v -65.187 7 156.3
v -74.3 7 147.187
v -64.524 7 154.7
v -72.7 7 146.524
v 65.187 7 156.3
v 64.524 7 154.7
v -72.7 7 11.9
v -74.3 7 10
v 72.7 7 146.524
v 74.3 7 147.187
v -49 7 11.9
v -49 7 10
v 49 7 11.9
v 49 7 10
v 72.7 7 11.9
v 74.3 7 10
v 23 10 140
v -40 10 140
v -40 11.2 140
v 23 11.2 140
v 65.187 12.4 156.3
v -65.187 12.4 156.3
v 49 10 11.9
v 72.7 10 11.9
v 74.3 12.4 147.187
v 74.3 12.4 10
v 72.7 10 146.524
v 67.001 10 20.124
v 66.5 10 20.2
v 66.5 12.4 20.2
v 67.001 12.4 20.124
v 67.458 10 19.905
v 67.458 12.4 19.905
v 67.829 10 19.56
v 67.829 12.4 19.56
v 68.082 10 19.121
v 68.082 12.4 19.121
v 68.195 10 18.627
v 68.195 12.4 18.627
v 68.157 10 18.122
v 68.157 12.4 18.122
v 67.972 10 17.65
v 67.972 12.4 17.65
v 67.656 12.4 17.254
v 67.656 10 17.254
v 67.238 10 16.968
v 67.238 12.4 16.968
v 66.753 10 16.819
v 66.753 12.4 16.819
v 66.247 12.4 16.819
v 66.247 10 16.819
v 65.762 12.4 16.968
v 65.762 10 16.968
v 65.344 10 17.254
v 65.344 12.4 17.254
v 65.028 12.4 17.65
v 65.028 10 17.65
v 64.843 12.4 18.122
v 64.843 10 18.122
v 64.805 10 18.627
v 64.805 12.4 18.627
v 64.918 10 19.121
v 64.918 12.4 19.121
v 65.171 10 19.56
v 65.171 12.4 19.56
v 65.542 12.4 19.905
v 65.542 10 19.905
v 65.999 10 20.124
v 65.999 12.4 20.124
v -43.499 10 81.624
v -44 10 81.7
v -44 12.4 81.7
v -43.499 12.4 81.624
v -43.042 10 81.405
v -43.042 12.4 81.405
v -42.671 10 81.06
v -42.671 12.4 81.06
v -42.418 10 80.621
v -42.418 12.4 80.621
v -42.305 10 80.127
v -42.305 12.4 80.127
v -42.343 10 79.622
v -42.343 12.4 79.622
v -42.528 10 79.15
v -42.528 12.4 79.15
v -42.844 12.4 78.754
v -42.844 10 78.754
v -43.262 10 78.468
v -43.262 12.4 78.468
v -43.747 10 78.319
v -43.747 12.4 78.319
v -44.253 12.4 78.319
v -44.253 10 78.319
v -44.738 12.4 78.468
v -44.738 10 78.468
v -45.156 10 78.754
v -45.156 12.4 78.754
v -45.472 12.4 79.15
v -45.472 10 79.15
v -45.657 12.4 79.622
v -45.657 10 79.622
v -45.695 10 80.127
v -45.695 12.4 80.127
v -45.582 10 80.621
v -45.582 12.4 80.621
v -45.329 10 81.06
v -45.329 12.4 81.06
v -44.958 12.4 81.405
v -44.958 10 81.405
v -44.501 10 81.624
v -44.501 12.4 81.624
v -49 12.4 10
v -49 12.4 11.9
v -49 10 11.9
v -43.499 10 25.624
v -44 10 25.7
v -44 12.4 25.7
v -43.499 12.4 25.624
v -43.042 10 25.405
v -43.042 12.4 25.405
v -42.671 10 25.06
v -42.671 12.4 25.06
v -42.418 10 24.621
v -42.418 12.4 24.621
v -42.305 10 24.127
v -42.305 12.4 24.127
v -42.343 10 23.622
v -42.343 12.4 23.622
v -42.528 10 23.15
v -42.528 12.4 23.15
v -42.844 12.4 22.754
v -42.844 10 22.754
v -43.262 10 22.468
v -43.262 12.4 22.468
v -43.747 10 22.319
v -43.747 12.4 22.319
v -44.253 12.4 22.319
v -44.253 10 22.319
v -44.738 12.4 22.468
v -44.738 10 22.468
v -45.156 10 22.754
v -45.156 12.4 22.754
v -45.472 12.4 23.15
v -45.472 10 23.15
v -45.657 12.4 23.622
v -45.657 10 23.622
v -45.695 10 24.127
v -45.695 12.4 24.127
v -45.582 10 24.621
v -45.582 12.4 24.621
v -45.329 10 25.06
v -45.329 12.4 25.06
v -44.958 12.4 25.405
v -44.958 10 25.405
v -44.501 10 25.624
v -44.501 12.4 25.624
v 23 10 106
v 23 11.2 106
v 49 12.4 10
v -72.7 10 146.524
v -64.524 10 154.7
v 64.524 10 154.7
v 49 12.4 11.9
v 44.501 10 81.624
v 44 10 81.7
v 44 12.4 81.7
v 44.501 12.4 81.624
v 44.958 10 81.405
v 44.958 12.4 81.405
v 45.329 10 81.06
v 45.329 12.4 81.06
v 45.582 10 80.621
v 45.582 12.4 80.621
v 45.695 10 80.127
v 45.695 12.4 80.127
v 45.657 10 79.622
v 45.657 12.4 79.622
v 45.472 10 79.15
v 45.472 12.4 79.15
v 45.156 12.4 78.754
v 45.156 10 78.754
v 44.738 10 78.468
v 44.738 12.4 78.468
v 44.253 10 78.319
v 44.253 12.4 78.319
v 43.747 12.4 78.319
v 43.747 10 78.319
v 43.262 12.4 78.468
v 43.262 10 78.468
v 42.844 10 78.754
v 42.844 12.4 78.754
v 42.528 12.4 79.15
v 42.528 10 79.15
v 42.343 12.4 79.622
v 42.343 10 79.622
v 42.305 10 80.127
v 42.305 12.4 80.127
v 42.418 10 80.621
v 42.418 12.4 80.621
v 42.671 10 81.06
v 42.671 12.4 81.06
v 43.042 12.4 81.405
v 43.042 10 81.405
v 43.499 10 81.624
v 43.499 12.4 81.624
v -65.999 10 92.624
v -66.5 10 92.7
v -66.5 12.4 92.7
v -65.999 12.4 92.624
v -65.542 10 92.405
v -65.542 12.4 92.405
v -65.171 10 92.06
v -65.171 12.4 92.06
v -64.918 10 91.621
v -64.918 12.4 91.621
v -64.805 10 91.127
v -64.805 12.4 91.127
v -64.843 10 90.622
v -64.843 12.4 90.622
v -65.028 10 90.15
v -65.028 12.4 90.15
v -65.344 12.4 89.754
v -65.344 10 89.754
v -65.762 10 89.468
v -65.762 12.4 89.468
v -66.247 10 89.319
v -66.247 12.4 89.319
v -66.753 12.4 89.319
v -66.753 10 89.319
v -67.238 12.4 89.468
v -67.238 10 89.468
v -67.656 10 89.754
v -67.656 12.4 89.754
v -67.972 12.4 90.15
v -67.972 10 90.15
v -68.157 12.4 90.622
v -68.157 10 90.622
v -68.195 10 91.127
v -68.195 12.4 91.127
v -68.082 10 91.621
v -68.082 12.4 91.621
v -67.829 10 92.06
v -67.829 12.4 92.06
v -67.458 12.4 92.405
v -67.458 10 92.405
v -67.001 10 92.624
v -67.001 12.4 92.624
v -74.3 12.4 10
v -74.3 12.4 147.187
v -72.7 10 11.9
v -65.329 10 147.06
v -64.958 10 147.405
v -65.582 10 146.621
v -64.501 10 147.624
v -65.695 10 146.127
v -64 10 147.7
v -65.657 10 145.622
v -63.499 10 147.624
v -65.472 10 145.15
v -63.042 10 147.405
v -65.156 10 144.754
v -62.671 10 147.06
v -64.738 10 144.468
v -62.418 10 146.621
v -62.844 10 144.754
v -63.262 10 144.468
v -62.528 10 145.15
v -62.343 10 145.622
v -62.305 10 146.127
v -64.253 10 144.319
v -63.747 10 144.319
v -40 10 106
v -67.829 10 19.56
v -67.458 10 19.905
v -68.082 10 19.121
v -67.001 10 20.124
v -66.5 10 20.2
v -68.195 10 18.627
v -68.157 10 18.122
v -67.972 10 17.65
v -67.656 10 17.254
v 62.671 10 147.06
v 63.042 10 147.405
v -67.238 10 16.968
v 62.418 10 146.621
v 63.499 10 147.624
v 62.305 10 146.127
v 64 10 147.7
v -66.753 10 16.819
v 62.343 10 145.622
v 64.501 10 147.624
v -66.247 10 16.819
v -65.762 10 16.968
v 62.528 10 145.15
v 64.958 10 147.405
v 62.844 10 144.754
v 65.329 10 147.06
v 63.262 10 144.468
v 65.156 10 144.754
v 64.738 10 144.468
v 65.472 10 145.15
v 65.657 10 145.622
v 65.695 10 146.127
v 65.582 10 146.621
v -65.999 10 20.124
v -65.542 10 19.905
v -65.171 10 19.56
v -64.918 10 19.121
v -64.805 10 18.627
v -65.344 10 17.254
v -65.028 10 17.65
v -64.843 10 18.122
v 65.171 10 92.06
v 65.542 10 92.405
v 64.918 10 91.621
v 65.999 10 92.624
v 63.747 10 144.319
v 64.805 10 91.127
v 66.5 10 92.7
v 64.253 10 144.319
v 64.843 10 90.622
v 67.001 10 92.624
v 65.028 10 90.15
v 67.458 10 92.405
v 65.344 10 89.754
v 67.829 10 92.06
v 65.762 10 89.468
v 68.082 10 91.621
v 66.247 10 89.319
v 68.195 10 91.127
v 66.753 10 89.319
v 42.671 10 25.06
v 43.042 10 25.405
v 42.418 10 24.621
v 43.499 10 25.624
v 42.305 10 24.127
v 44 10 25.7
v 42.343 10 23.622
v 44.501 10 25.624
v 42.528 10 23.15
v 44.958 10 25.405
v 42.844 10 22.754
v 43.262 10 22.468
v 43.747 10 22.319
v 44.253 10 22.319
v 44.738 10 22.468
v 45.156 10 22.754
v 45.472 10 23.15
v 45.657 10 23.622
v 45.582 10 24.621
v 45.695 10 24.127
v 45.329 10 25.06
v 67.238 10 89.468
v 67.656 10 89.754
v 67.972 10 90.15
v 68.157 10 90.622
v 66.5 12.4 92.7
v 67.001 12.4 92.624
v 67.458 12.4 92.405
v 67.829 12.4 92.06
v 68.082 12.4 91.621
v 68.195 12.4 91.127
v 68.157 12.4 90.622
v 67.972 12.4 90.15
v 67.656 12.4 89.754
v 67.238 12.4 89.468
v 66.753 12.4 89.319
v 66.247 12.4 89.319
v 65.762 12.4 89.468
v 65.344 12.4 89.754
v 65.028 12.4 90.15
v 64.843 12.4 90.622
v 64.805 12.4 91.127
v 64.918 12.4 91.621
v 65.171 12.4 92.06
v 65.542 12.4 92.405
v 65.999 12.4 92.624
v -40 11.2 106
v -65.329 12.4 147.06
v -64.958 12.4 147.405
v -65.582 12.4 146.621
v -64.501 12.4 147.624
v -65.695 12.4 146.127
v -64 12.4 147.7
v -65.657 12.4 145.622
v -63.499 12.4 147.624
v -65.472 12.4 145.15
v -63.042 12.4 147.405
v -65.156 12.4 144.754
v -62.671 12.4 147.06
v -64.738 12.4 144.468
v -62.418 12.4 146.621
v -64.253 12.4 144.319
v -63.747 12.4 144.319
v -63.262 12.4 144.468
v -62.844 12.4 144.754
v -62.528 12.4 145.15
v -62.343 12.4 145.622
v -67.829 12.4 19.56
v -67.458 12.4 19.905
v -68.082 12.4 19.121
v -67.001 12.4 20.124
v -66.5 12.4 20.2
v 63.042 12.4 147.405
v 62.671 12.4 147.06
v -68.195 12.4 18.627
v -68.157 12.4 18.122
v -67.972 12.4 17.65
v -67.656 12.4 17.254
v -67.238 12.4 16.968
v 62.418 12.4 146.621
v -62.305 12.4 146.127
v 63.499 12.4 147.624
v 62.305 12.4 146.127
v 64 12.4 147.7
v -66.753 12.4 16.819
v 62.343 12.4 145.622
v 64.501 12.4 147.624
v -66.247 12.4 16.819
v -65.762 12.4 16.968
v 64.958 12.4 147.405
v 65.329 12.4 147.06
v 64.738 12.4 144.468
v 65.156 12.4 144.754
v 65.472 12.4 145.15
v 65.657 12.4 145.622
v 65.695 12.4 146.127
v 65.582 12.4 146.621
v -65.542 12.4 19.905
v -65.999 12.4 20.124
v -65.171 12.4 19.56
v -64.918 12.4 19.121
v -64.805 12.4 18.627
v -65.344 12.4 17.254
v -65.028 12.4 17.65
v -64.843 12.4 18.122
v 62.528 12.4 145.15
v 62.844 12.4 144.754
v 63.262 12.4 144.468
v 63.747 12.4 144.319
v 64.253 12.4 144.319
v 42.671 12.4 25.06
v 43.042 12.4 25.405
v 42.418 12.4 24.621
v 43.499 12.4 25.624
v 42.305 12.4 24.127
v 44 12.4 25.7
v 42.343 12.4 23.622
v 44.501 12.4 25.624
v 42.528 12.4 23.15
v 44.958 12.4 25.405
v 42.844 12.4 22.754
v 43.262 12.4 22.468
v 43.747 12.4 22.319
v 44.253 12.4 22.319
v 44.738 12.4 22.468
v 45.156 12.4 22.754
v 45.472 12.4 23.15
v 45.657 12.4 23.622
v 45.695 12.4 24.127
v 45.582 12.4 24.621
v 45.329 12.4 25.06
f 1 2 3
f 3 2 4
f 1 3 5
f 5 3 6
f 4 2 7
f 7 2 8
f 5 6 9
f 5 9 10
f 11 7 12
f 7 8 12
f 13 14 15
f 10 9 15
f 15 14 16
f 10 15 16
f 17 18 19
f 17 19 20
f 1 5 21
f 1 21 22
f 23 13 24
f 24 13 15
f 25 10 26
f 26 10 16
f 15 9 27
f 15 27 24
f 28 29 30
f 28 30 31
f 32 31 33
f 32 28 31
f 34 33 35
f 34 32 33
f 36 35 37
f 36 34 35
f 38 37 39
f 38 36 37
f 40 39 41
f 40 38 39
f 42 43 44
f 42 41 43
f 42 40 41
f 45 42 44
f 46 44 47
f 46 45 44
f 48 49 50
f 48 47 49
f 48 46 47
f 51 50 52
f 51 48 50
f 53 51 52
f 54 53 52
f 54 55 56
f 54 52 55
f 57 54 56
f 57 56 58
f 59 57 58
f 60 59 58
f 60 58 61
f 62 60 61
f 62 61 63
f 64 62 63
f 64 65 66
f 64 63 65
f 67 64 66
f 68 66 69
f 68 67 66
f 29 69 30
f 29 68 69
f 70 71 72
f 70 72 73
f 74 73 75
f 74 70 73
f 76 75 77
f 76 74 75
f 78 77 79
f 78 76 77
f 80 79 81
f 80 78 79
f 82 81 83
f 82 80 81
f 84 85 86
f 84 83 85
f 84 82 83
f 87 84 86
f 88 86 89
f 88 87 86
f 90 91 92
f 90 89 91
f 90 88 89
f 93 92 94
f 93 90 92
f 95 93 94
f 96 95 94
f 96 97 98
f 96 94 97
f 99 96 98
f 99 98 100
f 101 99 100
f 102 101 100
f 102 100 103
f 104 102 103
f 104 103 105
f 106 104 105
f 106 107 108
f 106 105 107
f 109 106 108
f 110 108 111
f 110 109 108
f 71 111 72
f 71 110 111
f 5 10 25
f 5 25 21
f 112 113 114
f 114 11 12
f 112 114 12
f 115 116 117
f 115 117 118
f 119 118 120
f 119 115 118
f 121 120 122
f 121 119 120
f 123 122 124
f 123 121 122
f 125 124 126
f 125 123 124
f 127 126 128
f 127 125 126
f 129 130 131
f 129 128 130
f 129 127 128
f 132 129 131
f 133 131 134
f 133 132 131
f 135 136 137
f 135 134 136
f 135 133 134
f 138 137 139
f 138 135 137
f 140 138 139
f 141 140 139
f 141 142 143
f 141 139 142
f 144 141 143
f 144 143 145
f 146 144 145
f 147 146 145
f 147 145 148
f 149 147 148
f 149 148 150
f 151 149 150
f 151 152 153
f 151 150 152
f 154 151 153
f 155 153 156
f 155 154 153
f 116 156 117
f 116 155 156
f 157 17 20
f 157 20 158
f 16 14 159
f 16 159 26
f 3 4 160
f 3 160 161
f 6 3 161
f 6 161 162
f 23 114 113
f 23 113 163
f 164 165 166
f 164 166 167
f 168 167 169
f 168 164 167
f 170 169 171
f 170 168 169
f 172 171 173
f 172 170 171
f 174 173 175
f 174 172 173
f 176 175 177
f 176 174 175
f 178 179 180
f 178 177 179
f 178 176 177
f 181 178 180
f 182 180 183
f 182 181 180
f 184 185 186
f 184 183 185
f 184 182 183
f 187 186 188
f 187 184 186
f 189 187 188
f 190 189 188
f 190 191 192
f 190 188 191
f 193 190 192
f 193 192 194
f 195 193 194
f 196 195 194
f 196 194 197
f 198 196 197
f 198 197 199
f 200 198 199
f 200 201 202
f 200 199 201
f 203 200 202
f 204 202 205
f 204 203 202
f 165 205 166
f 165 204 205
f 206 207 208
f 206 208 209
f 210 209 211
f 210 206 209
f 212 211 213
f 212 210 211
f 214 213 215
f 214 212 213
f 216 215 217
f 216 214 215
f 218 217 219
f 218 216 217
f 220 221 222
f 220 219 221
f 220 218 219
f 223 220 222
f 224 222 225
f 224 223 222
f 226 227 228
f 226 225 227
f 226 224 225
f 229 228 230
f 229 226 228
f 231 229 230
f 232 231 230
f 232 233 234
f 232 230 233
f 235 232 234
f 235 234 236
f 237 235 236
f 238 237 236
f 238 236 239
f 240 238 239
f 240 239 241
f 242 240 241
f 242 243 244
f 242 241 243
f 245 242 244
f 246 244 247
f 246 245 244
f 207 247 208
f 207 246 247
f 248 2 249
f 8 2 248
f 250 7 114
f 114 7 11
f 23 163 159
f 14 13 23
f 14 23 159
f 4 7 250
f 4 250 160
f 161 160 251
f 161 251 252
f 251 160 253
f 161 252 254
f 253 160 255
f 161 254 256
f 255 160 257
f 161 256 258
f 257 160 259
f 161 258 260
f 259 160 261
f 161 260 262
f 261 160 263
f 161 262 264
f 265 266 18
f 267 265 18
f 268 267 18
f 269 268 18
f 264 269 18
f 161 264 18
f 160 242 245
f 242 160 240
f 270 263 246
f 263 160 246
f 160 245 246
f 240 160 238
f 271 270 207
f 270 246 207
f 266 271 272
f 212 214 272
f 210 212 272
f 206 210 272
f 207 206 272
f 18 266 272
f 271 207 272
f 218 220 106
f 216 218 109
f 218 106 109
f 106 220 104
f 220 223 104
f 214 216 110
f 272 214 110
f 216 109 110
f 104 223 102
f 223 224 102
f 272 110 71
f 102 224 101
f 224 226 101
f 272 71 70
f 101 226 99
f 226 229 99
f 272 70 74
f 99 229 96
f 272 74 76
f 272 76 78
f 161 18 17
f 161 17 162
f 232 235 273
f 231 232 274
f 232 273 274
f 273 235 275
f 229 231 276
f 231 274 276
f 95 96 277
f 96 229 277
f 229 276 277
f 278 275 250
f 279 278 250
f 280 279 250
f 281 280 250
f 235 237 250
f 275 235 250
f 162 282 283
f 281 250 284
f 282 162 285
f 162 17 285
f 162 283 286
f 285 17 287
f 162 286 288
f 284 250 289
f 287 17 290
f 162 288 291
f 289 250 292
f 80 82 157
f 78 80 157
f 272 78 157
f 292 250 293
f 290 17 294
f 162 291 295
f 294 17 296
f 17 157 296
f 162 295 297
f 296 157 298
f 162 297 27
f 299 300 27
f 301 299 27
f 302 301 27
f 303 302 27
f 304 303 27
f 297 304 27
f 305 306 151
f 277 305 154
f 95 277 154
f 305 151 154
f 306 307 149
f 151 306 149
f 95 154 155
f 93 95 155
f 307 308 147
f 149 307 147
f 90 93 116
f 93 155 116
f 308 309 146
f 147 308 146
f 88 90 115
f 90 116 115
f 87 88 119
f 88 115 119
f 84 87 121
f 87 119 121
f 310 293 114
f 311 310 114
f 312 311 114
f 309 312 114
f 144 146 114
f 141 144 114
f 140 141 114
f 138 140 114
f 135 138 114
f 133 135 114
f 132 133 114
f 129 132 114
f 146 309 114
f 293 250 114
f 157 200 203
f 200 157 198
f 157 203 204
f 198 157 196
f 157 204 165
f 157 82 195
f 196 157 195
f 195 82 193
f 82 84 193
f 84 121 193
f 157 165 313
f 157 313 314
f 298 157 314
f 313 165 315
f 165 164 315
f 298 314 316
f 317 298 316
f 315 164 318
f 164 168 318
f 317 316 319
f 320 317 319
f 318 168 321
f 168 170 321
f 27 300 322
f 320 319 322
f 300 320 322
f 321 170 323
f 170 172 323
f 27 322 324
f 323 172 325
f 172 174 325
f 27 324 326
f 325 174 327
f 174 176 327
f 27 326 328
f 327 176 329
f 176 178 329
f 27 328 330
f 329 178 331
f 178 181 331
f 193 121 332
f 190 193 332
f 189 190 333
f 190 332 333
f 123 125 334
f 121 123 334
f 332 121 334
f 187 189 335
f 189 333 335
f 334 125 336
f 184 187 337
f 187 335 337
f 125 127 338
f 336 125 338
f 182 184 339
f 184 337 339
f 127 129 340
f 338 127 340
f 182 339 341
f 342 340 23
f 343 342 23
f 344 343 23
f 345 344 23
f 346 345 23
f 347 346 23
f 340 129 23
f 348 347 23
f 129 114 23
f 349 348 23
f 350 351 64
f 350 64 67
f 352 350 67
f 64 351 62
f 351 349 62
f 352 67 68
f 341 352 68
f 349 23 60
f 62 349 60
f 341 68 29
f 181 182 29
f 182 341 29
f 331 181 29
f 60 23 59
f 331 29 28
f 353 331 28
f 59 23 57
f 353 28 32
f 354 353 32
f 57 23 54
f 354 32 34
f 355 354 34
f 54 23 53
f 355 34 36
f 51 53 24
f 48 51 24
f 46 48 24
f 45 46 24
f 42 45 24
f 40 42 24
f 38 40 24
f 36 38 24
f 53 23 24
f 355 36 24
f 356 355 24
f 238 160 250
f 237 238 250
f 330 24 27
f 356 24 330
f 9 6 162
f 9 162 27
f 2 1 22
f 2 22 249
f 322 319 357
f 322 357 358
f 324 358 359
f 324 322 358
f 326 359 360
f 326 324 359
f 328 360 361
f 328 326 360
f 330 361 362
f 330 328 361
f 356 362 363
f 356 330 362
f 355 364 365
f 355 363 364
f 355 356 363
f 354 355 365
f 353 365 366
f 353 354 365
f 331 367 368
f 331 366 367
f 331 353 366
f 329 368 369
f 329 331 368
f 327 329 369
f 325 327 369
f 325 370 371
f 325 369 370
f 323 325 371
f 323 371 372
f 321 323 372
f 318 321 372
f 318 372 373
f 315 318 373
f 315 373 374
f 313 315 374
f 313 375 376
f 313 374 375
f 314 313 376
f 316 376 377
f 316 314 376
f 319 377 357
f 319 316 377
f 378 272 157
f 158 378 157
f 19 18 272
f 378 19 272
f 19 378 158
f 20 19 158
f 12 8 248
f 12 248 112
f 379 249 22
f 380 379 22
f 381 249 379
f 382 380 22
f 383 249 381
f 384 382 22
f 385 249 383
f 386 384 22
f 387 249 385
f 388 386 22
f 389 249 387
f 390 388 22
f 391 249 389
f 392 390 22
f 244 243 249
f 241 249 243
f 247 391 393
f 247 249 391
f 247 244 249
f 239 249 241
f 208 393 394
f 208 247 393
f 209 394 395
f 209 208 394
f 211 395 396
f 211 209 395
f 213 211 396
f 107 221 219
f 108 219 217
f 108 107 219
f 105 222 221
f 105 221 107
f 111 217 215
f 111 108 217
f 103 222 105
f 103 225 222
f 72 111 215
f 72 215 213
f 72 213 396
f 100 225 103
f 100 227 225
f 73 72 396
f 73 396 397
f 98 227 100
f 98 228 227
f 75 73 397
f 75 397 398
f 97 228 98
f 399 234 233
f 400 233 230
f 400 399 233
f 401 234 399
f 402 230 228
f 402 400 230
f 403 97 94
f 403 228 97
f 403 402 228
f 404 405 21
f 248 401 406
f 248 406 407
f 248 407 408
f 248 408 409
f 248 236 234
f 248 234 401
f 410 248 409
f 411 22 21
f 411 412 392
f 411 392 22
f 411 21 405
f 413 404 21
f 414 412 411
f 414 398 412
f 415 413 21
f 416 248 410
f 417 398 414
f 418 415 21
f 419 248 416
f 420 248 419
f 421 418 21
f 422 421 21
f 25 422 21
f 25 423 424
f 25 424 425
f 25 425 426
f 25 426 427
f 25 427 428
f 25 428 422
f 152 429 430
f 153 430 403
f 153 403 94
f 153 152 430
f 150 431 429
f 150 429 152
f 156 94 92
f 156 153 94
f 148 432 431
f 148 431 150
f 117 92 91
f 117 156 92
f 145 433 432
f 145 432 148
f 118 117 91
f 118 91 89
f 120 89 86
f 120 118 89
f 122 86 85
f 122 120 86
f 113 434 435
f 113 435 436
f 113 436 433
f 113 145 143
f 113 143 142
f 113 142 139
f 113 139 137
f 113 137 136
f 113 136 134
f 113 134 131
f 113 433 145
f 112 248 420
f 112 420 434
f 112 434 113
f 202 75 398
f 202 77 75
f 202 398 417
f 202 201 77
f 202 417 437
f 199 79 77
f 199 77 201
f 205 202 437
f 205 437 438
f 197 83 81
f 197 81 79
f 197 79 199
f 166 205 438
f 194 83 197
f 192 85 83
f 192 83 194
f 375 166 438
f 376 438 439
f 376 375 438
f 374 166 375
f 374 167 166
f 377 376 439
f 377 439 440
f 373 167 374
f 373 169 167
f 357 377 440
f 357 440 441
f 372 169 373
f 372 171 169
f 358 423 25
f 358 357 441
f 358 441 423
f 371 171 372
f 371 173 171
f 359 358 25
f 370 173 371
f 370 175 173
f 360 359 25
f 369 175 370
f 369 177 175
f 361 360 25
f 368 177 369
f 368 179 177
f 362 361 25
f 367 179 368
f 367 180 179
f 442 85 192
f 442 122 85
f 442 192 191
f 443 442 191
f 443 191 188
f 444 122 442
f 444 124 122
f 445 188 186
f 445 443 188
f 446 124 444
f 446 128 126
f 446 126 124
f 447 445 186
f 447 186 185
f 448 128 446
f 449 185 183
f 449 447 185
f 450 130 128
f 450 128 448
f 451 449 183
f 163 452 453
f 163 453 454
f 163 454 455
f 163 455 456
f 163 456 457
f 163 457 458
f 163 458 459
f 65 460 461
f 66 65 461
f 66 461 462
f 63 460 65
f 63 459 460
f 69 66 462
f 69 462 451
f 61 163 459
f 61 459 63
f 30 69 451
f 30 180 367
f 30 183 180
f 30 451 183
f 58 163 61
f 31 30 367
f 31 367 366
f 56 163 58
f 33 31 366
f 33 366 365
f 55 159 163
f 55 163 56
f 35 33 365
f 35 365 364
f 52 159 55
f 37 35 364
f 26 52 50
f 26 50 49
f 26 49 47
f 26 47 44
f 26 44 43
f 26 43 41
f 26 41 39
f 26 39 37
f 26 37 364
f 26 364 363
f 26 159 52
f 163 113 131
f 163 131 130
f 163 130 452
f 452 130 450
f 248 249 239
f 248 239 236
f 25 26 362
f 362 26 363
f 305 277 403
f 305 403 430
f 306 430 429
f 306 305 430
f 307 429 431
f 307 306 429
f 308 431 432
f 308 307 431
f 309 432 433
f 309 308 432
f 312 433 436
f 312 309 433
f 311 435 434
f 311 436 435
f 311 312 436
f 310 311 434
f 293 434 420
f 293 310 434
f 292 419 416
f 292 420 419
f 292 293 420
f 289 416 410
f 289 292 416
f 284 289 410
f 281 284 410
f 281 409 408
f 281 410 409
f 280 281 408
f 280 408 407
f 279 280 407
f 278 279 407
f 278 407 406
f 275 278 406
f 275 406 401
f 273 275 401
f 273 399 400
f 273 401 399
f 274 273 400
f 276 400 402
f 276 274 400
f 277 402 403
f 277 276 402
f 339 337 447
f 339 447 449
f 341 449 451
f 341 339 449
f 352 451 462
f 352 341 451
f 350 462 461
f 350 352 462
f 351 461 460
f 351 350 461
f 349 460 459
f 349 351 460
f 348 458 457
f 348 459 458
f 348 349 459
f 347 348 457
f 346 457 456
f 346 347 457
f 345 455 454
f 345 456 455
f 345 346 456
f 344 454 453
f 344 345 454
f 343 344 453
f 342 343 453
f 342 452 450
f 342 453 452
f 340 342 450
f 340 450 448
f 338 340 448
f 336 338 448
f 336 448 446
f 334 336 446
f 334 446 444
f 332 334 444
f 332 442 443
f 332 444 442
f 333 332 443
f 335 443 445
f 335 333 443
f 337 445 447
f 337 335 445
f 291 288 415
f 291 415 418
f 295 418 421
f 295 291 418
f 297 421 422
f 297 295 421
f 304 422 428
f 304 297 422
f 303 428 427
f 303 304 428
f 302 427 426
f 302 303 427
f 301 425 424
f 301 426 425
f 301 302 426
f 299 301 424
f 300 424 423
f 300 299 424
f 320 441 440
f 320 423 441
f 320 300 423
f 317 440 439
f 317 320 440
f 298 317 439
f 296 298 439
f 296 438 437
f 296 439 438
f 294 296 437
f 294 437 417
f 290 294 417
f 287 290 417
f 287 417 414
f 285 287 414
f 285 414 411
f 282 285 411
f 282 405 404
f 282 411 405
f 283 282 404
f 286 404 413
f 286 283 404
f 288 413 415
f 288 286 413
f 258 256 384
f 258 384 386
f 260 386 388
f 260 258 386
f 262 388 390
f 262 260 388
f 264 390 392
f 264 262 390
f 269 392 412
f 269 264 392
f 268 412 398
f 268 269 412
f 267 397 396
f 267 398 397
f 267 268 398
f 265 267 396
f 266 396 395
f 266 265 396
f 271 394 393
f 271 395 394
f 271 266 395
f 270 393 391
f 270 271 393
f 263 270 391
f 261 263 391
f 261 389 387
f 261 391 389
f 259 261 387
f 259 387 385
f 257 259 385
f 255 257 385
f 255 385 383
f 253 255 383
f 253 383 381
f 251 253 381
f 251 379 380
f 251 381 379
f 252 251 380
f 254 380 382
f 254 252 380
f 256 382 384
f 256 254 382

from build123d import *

# Parameters (mm, degrees)
LID_PLATE_DEPTH        = 2.4
DRIP_SKIRT_DEPTH       = 3.01
SKETCH3_W              = 25.3
SKETCH3_H              = 1.9
FRONT_SKIRT_L_DEPTH    = 5.4
SKETCH4_W              = 25.3
SKETCH4_H              = 1.9
FRONT_SKIRT_R_DEPTH    = 5.4
SKETCH5_W              = 63
SKETCH5_H              = 34
GNSS_THIN_WINDOW_DEPTH = 1.7
SKETCH6_R              = 1.7
SCREW_HOLES_DEPTH      = 4.4


with BuildPart() as part:
    # Sketch1 → Lid Plate (new body)
    with BuildSketch(Plane(origin=(0, 10, 0), x_dir=(1, 0, 0), z_dir=(0, 1, 0))):
        Polygon((-65.187005769, -156.3), (65.187005769, -156.3), (74.3, -147.187005769), (74.3, -11.9), (-74.3, -11.9), (-74.3, -147.187005769), align=None)
    extrude(amount=LID_PLATE_DEPTH)

    # Sketch2 → Drip Skirt (add)
    with BuildSketch(Plane(origin=(0, 7, 0), x_dir=(1, 0, 0), z_dir=(0, 1, 0))):
        Polygon((74.3, -11.9), (74.3, -147.187005769), (65.187005769, -156.3), (-65.187005769, -156.3), (-74.3, -147.187005769), (-74.3, -11.9), (-72.7, -11.9), (-72.7, -146.524264069), (-64.524264069, -154.7), (64.524264069, -154.7), (72.7, -146.524264069), (72.7, -11.9), align=None)
    extrude(amount=DRIP_SKIRT_DEPTH)

    # Sketch3 → Front Skirt L (add)
    with BuildSketch(Plane(origin=(0, 7, 0), x_dir=(1, 0, 0), z_dir=(0, 1, 0))):
        with Locations((-61.65, -10.95)):
            Rectangle(SKETCH3_W, SKETCH3_H)
    extrude(amount=FRONT_SKIRT_L_DEPTH)

    # Sketch4 → Front Skirt R (add)
    with BuildSketch(Plane(origin=(0, 7, 0), x_dir=(1, 0, 0), z_dir=(0, 1, 0))):
        with Locations((61.65, -10.95)):
            Rectangle(SKETCH4_W, SKETCH4_H)
    extrude(amount=FRONT_SKIRT_R_DEPTH)

    # Sketch5 → GNSS Thin Window (cut)
    with BuildSketch(Plane(origin=(0, 9.5, 0), x_dir=(1, 0, 0), z_dir=(0, 1, 0))):
        with Locations((-8.5, -123)):
            Rectangle(SKETCH5_W, SKETCH5_H)
    extrude(amount=GNSS_THIN_WINDOW_DEPTH, mode=Mode.SUBTRACT)

    # Sketch6 → Screw Holes (cut)
    with BuildSketch(Plane(origin=(0, 9, 0), x_dir=(1, 0, 0), z_dir=(0, 1, 0))):
        with Locations(Location((-66.5, -18.5, 0), (0, 0, 270))):
            Circle(SKETCH6_R)
        with Locations(Location((66.5, -18.5, 0), (0, 0, 270))):
            Circle(SKETCH6_R)
        with Locations(Location((-66.5, -91, 0), (0, 0, 270))):
            Circle(SKETCH6_R)
        with Locations(Location((66.5, -91, 0), (0, 0, 270))):
            Circle(SKETCH6_R)
        with Locations(Location((-64, -146, 0), (0, 0, 270))):
            Circle(SKETCH6_R)
        with Locations(Location((64, -146, 0), (0, 0, 270))):
            Circle(SKETCH6_R)
        with Locations(Location((-44, -24, 0), (0, 0, 270))):
            Circle(SKETCH6_R)
        with Locations(Location((-44, -80, 0), (0, 0, 270))):
            Circle(SKETCH6_R)
        with Locations(Location((44, -24, 0), (0, 0, 270))):
            Circle(SKETCH6_R)
        with Locations(Location((44, -80, 0), (0, 0, 270))):
            Circle(SKETCH6_R)
    extrude(amount=SCREW_HOLES_DEPTH, mode=Mode.SUBTRACT)


solid = part.part
